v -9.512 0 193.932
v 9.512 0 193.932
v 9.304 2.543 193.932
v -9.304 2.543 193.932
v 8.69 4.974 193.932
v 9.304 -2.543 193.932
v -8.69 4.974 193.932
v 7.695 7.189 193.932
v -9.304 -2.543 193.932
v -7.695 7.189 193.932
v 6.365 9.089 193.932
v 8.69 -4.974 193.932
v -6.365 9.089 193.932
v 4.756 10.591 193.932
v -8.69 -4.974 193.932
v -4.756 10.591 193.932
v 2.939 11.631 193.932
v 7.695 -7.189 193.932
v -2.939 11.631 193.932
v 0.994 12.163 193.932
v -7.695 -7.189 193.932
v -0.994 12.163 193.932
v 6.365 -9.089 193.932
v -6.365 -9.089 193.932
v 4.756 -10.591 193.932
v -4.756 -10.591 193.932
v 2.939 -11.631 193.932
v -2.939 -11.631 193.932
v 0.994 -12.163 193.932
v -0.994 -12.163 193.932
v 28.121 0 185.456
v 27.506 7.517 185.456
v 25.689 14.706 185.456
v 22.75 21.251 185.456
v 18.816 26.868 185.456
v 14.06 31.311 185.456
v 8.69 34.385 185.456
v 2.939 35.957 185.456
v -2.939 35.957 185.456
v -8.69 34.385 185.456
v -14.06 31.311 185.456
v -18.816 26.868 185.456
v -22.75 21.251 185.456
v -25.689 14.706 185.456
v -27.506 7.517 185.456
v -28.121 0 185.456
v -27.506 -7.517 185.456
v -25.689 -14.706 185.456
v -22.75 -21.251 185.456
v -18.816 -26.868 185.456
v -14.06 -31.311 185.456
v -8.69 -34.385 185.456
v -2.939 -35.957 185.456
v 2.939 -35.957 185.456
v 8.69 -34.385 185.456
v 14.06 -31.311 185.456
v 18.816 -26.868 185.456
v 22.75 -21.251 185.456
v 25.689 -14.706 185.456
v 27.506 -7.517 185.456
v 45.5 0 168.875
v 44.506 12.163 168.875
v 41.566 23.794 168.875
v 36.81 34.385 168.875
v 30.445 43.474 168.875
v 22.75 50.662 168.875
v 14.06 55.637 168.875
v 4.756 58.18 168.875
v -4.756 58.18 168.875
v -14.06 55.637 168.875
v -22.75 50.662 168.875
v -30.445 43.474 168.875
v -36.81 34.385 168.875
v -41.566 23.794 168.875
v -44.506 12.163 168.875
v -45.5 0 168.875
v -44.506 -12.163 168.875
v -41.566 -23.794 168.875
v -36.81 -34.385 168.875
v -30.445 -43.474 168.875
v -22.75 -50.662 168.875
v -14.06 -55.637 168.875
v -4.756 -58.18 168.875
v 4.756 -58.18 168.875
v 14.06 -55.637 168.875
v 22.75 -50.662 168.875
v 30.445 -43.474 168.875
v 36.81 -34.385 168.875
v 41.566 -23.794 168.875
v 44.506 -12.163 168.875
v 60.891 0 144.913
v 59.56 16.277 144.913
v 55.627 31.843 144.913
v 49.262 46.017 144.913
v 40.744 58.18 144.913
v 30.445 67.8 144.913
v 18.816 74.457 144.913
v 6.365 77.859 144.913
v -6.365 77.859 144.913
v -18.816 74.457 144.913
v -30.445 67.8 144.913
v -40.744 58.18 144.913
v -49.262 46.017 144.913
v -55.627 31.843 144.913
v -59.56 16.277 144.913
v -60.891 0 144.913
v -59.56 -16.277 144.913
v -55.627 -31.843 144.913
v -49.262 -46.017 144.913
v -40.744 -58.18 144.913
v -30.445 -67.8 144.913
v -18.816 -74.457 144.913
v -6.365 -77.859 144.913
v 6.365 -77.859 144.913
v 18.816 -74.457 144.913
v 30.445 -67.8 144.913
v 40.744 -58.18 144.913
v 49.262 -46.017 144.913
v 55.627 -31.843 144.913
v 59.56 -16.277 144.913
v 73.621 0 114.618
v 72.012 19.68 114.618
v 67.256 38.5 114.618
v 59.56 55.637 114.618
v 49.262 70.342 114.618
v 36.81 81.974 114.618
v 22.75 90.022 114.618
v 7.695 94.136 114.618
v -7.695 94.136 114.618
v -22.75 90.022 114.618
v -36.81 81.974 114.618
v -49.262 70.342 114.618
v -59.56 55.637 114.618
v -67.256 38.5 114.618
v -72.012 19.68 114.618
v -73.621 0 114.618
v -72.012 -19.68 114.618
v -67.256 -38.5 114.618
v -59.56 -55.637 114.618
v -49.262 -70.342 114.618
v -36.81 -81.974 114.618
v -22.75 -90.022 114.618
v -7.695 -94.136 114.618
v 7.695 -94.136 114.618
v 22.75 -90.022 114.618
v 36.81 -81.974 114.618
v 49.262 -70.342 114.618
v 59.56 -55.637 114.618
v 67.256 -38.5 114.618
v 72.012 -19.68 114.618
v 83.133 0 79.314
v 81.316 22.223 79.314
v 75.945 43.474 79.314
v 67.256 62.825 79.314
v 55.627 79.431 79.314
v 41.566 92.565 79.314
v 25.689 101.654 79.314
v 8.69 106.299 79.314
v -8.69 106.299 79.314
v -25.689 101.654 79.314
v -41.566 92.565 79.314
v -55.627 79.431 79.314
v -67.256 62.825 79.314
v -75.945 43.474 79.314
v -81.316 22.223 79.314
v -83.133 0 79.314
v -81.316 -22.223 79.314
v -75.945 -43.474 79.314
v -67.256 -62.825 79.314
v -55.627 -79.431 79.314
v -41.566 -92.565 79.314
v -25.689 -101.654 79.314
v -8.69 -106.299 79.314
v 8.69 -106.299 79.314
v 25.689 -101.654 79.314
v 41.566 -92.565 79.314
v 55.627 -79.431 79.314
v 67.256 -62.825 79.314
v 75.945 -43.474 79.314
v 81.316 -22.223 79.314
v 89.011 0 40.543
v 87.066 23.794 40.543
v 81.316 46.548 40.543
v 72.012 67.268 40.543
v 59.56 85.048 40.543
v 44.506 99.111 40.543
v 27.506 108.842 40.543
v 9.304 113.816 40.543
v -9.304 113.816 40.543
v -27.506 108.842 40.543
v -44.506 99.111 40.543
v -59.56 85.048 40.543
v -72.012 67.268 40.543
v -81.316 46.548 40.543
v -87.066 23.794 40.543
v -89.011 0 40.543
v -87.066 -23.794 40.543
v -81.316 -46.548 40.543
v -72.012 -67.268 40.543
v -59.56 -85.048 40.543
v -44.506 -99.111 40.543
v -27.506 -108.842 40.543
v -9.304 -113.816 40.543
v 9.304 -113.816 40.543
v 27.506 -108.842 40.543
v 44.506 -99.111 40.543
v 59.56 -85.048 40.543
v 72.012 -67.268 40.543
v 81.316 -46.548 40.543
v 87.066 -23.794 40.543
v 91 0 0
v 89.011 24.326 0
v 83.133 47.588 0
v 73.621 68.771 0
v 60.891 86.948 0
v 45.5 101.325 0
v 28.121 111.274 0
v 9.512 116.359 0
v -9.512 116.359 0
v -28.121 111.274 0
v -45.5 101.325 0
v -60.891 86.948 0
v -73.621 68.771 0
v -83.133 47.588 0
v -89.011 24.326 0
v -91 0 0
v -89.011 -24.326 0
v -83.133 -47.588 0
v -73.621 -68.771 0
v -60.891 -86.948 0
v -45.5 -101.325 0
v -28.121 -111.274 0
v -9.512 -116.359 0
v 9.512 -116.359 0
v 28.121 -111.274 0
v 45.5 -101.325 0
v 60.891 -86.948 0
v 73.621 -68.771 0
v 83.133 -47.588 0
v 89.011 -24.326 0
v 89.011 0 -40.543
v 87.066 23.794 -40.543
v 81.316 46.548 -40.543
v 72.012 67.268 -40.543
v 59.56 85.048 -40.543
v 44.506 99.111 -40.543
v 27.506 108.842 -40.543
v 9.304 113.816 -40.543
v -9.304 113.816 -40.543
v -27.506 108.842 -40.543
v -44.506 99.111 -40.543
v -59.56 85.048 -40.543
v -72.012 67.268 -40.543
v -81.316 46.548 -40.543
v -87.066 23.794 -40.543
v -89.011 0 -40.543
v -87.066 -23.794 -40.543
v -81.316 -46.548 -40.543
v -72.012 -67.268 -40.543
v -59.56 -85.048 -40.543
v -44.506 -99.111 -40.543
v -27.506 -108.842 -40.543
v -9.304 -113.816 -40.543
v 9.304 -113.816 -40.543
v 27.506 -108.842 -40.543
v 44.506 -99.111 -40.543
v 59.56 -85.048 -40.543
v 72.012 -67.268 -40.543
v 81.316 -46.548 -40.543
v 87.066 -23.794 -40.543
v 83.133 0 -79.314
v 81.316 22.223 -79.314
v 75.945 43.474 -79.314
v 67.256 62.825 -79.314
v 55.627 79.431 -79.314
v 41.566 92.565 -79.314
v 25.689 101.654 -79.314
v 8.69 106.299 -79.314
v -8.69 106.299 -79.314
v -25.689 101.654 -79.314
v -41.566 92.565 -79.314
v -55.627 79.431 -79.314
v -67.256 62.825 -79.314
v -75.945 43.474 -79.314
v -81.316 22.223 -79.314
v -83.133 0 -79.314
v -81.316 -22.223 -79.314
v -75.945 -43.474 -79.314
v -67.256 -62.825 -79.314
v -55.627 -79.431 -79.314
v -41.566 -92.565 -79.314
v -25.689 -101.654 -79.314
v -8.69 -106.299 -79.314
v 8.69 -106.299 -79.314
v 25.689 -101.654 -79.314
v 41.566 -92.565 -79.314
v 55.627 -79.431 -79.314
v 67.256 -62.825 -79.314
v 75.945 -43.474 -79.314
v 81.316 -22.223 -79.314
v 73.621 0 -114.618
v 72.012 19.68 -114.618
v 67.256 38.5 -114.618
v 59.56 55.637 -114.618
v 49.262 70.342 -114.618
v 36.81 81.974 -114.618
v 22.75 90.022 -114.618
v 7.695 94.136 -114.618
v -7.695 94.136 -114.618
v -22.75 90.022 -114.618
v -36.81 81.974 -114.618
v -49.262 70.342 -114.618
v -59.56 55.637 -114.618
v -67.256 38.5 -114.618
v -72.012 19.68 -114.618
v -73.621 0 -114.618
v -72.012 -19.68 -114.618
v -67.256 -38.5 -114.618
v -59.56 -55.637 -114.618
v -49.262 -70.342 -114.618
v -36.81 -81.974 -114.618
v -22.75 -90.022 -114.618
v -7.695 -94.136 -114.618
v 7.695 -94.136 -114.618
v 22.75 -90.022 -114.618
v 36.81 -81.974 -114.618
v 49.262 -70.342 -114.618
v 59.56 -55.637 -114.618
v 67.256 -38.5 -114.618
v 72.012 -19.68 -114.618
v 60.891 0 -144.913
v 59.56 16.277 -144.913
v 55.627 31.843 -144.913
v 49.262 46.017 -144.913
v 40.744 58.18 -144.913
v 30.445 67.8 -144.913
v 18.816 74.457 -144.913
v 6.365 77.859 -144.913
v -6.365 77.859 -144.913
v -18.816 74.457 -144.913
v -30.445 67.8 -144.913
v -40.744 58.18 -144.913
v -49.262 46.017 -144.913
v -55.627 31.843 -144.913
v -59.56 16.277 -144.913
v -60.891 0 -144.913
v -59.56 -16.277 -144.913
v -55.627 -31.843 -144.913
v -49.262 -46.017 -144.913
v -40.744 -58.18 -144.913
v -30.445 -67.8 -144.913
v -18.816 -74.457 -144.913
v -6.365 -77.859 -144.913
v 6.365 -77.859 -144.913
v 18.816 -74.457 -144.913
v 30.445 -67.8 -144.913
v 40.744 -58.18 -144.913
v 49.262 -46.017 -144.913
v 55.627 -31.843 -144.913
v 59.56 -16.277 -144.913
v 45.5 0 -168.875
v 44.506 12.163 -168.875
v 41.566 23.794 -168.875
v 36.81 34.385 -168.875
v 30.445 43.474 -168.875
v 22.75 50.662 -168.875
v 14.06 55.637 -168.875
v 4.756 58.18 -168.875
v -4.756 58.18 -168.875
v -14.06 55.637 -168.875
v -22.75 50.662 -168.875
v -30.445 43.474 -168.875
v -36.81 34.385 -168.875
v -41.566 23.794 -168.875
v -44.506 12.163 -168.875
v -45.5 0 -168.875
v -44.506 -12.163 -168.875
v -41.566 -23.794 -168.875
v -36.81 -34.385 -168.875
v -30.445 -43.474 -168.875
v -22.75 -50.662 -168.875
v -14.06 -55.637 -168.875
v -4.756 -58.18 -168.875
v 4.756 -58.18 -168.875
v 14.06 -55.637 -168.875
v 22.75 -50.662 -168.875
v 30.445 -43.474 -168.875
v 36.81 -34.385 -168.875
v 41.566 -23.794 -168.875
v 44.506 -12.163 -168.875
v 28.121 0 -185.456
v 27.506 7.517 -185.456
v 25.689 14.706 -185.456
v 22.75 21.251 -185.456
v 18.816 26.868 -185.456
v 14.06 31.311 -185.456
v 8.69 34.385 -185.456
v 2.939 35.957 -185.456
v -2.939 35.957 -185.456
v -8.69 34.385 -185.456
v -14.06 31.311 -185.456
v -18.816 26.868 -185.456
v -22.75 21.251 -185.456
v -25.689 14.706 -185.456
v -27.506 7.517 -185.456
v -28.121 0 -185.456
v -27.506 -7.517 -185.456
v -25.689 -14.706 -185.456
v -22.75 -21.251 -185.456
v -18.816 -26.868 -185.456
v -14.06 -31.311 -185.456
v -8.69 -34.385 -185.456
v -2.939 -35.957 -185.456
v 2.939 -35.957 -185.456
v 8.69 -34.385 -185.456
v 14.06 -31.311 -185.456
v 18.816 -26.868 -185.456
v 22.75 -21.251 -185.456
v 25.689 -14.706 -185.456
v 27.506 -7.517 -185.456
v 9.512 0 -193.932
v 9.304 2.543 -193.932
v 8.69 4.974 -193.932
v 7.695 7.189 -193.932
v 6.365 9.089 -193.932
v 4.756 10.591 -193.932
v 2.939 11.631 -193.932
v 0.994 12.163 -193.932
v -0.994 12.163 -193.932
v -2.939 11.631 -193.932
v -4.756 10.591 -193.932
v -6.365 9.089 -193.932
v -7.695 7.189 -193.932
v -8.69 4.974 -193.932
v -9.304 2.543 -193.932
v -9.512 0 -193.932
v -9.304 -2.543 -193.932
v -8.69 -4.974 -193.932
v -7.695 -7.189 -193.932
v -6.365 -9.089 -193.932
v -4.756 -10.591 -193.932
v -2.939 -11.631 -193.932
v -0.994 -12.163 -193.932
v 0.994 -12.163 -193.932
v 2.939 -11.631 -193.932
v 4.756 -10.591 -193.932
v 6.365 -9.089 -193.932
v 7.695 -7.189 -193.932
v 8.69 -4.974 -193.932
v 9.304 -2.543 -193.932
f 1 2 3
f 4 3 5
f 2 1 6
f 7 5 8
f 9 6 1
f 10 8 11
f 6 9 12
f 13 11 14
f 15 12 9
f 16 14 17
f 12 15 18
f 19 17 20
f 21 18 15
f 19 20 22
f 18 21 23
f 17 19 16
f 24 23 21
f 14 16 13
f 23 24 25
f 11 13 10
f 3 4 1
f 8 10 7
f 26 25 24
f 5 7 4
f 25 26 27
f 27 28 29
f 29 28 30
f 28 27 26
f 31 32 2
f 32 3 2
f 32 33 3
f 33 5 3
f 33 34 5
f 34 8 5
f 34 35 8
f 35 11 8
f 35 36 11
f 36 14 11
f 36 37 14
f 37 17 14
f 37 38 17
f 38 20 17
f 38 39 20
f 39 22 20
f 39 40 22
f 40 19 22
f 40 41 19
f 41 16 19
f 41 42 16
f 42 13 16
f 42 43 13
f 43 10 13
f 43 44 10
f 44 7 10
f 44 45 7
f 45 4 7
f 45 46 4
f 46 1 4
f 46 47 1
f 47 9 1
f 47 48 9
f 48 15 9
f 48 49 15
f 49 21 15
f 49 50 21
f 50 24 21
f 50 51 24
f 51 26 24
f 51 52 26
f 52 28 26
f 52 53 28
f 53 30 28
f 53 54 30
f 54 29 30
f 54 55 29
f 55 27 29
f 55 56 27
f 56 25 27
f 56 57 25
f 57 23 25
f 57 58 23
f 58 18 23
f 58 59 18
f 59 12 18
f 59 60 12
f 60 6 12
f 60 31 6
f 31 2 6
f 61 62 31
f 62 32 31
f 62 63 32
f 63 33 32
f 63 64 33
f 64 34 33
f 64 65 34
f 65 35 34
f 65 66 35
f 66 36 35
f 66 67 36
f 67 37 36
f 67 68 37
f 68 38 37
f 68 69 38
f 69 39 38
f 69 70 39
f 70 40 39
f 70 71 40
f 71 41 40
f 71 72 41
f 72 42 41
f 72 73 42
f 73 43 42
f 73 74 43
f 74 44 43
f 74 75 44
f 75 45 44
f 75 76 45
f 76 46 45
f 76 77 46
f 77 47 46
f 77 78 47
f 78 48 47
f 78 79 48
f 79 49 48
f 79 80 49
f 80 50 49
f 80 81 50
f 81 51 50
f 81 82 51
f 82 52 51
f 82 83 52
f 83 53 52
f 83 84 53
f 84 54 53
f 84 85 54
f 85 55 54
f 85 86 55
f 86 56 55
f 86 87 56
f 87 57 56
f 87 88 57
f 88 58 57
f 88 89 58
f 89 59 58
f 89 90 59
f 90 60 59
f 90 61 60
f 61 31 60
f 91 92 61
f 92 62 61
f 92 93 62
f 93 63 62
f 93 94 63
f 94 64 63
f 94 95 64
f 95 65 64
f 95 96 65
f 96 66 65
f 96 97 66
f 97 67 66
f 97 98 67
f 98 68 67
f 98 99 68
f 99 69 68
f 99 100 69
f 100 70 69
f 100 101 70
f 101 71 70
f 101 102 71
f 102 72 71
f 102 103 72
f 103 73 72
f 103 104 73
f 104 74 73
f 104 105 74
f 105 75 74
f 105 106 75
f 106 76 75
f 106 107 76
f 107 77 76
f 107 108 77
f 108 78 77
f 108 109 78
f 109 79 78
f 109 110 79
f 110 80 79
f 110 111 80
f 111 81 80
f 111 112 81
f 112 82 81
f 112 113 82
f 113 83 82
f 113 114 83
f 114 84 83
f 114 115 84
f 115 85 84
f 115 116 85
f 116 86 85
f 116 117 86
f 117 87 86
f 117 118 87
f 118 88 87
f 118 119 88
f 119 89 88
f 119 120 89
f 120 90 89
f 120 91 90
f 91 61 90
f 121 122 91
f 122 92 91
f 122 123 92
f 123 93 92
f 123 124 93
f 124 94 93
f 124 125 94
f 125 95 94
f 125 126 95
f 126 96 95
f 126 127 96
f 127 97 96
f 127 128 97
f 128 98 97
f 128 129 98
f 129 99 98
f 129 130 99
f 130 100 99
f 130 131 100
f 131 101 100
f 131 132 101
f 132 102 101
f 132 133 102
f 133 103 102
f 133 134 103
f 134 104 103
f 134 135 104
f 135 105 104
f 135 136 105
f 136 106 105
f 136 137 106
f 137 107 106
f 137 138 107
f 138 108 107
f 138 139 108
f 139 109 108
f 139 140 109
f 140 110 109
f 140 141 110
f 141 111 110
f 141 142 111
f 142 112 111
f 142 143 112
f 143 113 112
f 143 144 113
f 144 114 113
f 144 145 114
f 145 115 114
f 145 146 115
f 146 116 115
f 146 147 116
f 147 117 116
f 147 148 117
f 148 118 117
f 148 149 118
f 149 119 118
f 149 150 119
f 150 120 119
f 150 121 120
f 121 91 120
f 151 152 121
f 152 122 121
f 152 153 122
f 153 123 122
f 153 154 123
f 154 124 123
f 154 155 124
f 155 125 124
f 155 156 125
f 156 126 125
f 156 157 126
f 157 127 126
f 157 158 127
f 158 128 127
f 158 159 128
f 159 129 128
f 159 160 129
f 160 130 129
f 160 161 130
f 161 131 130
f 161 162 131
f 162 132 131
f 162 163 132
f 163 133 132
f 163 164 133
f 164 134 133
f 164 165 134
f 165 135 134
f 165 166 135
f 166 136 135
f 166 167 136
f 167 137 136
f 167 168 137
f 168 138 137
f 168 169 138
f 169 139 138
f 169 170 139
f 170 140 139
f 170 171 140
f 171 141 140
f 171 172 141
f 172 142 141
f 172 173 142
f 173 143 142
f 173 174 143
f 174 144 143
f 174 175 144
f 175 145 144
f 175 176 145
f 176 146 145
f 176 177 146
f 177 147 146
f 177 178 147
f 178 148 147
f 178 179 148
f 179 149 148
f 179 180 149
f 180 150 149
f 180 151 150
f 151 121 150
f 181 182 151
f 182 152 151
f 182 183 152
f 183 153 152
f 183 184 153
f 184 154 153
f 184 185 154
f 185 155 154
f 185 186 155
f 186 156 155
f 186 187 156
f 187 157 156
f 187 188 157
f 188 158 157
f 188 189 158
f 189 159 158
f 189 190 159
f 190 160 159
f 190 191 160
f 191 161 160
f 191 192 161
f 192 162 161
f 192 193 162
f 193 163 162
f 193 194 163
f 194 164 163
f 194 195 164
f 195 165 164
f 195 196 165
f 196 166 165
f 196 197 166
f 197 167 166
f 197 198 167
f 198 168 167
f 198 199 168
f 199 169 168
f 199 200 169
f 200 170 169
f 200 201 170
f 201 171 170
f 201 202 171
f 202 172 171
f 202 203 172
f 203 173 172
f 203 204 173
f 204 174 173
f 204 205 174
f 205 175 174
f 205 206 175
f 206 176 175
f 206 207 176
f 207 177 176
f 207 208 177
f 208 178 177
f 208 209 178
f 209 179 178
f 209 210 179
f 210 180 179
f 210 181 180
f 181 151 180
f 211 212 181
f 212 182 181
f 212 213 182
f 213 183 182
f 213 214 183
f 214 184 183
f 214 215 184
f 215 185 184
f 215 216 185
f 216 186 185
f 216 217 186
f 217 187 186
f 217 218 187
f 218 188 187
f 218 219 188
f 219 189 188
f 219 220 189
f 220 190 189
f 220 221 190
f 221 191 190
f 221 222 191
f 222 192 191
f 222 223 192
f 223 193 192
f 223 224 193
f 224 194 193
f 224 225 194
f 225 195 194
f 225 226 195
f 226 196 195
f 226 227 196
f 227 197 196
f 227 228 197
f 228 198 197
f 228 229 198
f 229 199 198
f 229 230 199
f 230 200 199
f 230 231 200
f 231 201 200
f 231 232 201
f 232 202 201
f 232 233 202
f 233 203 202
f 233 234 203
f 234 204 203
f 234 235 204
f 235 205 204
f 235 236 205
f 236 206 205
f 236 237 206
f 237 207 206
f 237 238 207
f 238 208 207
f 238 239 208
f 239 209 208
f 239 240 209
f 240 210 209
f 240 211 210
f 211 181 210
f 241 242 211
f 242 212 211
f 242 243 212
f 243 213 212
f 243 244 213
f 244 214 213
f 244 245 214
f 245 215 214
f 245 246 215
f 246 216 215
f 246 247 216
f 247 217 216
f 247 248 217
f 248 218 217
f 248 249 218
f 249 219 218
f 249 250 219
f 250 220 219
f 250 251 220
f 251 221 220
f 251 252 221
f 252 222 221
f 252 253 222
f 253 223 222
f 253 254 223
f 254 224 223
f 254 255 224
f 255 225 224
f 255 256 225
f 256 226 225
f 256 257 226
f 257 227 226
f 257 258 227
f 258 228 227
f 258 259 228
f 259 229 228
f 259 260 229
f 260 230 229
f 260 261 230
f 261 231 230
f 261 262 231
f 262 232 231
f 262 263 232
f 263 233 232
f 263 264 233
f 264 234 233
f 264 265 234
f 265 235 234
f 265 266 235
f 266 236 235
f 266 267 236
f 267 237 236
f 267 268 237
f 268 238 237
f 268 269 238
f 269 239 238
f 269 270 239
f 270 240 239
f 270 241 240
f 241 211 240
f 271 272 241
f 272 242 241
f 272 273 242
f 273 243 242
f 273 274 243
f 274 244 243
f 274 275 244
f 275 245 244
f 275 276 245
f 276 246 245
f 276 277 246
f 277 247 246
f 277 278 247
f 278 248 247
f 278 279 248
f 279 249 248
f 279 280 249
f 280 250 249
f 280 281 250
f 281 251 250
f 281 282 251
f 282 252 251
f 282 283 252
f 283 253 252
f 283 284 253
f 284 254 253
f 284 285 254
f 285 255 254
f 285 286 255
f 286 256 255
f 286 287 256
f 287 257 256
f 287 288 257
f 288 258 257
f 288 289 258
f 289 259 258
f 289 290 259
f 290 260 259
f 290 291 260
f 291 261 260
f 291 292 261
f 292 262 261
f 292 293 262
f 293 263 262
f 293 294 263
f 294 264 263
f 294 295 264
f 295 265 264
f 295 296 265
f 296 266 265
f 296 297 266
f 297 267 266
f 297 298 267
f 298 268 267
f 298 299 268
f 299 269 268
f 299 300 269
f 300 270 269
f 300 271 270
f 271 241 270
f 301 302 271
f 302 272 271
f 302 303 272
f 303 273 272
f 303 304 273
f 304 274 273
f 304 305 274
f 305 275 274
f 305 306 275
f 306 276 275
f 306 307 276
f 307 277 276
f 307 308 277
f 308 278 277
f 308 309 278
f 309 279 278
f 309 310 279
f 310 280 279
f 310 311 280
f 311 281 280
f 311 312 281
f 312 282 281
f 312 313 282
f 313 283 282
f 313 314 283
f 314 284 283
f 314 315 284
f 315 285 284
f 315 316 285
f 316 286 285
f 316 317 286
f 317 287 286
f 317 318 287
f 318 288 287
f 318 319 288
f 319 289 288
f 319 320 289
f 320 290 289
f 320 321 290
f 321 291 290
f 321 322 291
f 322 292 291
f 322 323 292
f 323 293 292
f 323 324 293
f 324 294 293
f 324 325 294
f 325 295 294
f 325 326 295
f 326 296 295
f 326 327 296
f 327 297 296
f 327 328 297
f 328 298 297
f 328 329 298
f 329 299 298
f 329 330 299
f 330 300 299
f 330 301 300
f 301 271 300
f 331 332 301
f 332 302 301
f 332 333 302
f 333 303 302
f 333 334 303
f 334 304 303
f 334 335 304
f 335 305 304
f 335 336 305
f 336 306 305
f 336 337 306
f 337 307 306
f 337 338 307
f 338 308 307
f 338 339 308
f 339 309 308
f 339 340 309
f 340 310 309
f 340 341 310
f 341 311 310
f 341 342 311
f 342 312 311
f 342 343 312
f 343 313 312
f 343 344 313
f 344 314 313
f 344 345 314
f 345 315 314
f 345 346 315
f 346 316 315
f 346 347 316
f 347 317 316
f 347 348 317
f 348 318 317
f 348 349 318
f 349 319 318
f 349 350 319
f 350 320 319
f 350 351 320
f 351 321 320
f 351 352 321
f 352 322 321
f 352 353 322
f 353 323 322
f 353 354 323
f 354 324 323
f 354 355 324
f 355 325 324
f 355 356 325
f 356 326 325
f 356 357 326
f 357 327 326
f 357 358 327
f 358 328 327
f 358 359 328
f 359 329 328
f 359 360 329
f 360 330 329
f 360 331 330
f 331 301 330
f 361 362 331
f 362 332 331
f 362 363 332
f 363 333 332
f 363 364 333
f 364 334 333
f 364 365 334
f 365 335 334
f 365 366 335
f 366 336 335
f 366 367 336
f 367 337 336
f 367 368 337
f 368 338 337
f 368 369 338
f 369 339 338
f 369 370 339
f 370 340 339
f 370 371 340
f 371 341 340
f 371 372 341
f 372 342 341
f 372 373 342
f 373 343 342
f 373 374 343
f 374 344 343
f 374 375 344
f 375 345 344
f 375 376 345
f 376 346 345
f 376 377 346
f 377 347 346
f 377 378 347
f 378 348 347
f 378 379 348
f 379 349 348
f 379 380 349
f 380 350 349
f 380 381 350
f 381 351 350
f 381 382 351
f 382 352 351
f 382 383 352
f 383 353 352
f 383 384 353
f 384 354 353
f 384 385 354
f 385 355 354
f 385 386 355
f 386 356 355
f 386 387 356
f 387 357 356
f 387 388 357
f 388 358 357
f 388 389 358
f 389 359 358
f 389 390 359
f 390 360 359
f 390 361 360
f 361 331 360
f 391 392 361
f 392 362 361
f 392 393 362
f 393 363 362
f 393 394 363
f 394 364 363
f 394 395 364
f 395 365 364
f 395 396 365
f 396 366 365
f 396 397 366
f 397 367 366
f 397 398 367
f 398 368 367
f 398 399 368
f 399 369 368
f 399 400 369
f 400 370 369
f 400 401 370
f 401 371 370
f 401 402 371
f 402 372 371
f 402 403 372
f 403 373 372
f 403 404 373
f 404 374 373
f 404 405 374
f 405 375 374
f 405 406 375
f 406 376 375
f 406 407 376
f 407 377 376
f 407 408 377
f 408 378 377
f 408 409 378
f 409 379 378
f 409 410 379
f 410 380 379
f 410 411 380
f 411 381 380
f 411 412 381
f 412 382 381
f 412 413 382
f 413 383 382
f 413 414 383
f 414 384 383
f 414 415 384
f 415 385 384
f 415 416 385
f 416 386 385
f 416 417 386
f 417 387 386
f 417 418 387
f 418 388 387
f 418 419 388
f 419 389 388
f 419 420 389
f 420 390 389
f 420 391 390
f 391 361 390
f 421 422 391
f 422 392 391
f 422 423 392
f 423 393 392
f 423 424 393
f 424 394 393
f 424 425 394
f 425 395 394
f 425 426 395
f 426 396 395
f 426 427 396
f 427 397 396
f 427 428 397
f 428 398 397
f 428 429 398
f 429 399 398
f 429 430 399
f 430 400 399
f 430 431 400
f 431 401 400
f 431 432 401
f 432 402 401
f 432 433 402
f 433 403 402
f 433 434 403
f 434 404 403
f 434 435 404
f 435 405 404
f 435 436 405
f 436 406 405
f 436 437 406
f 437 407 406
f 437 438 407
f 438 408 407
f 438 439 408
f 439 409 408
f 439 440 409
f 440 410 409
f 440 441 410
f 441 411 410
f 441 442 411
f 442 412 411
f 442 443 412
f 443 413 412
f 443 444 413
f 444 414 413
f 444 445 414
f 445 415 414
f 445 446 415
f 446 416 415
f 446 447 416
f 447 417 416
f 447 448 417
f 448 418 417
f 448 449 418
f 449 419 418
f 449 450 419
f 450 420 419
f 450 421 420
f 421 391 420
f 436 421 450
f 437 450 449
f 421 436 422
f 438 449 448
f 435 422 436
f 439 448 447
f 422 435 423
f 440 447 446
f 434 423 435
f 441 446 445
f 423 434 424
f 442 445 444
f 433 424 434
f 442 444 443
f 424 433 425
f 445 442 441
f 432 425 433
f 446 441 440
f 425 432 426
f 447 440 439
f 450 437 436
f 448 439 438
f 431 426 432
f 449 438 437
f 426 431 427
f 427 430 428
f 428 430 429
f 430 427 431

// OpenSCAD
// Generated by SolidPython 1.0.1 on 2020-07-29 00:46:47


scale(v = [7, 9, 15]) {
	sphere(r = 13);
}
/***********************************************
*********      SolidPython code:      **********
************************************************
 
# import packages: SolidPython
from solid import *
from solid.utils import *
from itertools import chain, combinations, permutations


class Resize:

    def __init__(self, scad_file):
        self.scad_file = scad_file
        #self.scad_file = import_scad(scad_file)
        # cone/cylinder param:
        self.r1 = 0
        self.r2 = 0
        self.h = 0
        # rectangular prism param:
        self.w = 0
        self.l = 0
        # ellipse param:
        self.r = 0

    # import OpenScad code (file name corresponds to shape)


    # classify shape + parameters
    def assign(self, param1, param2, param3):
        if self.scad_file == 'cone.scad':
            self.r1 = param1
            self.r2 = param2
            self.h = param3
        elif self.scad_file == 'cylinder.scad':
            self.r1 = param1
            self.r2 = param2
            self.h = param3
        elif self.scad_file == 'rectangularPrism.scad':
            self.h = param1
            self.l = param2
            self.w = param3
        else:
            self.r = param1
            self.h = param2

    # resize parameters
    def iterate(self):
        x = range(3, 20, 2)
        i = 1
        if self.scad_file == 'cone.scad':
            tempList = list(permutations(x, 2))
            for temp in tempList:
                param1 = temp[0]
                param2 = temp[1]
                filepath = 'produced_scad_files/' + 'cone' + str(param1) + '_' + str(param2) + '_' + '.scad'
                scad_render_to_file(cylinder(h=param1, r1=param2, r2=0), filepath)

        elif self.scad_file == 'cylinder.scad':
            tempList = list(permutations(x, 3))
            for temp in tempList:
                param1 = temp[0]
                param2 = temp[1]
                filepath = 'produced_scad_files/' + 'cylinder' + str(param1) + '_' + str(param2) + '_' + '.scad'
                scad_render_to_file(cylinder(h=param1, r1=param2, r2=param2), filepath)

        elif self.scad_file == 'rectangularPrism.scad':
            tempList = list(permutations(x, 3))
            for temp in tempList:
                param1 = temp[0]
                param2 = temp[1]
                param3 = temp[2]
                filepath = 'produced_scad_files/' + 'rectangularPrism' + str(param1) + '_' + str(param2) + '_' + str(
                    param3) + '.scad'
                scad_render_to_file(cube(size=(param1, param2, param3)), filepath)

        elif self.scad_file == 'ellipse.scad':
            tempList = list(permutations(x, 4))
            for temp in tempList:
                param1 = temp[0]
                param2 = temp[1]
                param3 = temp[2]
                param4 = temp[3]
                filepath = 'produced_scad_files/' + 'ellipse' + str(param1) + '_' + str(param2) + '_' + str(param3) + '_' + str(param4) + '.scad'
                scad_render_to_file(scale([param1, param2, param3])(sphere(r=param4)), filepath)

    def render_to_scadfile(self):
        scad_render_to_file(scad, 'example.scad') 
 
************************************************/
